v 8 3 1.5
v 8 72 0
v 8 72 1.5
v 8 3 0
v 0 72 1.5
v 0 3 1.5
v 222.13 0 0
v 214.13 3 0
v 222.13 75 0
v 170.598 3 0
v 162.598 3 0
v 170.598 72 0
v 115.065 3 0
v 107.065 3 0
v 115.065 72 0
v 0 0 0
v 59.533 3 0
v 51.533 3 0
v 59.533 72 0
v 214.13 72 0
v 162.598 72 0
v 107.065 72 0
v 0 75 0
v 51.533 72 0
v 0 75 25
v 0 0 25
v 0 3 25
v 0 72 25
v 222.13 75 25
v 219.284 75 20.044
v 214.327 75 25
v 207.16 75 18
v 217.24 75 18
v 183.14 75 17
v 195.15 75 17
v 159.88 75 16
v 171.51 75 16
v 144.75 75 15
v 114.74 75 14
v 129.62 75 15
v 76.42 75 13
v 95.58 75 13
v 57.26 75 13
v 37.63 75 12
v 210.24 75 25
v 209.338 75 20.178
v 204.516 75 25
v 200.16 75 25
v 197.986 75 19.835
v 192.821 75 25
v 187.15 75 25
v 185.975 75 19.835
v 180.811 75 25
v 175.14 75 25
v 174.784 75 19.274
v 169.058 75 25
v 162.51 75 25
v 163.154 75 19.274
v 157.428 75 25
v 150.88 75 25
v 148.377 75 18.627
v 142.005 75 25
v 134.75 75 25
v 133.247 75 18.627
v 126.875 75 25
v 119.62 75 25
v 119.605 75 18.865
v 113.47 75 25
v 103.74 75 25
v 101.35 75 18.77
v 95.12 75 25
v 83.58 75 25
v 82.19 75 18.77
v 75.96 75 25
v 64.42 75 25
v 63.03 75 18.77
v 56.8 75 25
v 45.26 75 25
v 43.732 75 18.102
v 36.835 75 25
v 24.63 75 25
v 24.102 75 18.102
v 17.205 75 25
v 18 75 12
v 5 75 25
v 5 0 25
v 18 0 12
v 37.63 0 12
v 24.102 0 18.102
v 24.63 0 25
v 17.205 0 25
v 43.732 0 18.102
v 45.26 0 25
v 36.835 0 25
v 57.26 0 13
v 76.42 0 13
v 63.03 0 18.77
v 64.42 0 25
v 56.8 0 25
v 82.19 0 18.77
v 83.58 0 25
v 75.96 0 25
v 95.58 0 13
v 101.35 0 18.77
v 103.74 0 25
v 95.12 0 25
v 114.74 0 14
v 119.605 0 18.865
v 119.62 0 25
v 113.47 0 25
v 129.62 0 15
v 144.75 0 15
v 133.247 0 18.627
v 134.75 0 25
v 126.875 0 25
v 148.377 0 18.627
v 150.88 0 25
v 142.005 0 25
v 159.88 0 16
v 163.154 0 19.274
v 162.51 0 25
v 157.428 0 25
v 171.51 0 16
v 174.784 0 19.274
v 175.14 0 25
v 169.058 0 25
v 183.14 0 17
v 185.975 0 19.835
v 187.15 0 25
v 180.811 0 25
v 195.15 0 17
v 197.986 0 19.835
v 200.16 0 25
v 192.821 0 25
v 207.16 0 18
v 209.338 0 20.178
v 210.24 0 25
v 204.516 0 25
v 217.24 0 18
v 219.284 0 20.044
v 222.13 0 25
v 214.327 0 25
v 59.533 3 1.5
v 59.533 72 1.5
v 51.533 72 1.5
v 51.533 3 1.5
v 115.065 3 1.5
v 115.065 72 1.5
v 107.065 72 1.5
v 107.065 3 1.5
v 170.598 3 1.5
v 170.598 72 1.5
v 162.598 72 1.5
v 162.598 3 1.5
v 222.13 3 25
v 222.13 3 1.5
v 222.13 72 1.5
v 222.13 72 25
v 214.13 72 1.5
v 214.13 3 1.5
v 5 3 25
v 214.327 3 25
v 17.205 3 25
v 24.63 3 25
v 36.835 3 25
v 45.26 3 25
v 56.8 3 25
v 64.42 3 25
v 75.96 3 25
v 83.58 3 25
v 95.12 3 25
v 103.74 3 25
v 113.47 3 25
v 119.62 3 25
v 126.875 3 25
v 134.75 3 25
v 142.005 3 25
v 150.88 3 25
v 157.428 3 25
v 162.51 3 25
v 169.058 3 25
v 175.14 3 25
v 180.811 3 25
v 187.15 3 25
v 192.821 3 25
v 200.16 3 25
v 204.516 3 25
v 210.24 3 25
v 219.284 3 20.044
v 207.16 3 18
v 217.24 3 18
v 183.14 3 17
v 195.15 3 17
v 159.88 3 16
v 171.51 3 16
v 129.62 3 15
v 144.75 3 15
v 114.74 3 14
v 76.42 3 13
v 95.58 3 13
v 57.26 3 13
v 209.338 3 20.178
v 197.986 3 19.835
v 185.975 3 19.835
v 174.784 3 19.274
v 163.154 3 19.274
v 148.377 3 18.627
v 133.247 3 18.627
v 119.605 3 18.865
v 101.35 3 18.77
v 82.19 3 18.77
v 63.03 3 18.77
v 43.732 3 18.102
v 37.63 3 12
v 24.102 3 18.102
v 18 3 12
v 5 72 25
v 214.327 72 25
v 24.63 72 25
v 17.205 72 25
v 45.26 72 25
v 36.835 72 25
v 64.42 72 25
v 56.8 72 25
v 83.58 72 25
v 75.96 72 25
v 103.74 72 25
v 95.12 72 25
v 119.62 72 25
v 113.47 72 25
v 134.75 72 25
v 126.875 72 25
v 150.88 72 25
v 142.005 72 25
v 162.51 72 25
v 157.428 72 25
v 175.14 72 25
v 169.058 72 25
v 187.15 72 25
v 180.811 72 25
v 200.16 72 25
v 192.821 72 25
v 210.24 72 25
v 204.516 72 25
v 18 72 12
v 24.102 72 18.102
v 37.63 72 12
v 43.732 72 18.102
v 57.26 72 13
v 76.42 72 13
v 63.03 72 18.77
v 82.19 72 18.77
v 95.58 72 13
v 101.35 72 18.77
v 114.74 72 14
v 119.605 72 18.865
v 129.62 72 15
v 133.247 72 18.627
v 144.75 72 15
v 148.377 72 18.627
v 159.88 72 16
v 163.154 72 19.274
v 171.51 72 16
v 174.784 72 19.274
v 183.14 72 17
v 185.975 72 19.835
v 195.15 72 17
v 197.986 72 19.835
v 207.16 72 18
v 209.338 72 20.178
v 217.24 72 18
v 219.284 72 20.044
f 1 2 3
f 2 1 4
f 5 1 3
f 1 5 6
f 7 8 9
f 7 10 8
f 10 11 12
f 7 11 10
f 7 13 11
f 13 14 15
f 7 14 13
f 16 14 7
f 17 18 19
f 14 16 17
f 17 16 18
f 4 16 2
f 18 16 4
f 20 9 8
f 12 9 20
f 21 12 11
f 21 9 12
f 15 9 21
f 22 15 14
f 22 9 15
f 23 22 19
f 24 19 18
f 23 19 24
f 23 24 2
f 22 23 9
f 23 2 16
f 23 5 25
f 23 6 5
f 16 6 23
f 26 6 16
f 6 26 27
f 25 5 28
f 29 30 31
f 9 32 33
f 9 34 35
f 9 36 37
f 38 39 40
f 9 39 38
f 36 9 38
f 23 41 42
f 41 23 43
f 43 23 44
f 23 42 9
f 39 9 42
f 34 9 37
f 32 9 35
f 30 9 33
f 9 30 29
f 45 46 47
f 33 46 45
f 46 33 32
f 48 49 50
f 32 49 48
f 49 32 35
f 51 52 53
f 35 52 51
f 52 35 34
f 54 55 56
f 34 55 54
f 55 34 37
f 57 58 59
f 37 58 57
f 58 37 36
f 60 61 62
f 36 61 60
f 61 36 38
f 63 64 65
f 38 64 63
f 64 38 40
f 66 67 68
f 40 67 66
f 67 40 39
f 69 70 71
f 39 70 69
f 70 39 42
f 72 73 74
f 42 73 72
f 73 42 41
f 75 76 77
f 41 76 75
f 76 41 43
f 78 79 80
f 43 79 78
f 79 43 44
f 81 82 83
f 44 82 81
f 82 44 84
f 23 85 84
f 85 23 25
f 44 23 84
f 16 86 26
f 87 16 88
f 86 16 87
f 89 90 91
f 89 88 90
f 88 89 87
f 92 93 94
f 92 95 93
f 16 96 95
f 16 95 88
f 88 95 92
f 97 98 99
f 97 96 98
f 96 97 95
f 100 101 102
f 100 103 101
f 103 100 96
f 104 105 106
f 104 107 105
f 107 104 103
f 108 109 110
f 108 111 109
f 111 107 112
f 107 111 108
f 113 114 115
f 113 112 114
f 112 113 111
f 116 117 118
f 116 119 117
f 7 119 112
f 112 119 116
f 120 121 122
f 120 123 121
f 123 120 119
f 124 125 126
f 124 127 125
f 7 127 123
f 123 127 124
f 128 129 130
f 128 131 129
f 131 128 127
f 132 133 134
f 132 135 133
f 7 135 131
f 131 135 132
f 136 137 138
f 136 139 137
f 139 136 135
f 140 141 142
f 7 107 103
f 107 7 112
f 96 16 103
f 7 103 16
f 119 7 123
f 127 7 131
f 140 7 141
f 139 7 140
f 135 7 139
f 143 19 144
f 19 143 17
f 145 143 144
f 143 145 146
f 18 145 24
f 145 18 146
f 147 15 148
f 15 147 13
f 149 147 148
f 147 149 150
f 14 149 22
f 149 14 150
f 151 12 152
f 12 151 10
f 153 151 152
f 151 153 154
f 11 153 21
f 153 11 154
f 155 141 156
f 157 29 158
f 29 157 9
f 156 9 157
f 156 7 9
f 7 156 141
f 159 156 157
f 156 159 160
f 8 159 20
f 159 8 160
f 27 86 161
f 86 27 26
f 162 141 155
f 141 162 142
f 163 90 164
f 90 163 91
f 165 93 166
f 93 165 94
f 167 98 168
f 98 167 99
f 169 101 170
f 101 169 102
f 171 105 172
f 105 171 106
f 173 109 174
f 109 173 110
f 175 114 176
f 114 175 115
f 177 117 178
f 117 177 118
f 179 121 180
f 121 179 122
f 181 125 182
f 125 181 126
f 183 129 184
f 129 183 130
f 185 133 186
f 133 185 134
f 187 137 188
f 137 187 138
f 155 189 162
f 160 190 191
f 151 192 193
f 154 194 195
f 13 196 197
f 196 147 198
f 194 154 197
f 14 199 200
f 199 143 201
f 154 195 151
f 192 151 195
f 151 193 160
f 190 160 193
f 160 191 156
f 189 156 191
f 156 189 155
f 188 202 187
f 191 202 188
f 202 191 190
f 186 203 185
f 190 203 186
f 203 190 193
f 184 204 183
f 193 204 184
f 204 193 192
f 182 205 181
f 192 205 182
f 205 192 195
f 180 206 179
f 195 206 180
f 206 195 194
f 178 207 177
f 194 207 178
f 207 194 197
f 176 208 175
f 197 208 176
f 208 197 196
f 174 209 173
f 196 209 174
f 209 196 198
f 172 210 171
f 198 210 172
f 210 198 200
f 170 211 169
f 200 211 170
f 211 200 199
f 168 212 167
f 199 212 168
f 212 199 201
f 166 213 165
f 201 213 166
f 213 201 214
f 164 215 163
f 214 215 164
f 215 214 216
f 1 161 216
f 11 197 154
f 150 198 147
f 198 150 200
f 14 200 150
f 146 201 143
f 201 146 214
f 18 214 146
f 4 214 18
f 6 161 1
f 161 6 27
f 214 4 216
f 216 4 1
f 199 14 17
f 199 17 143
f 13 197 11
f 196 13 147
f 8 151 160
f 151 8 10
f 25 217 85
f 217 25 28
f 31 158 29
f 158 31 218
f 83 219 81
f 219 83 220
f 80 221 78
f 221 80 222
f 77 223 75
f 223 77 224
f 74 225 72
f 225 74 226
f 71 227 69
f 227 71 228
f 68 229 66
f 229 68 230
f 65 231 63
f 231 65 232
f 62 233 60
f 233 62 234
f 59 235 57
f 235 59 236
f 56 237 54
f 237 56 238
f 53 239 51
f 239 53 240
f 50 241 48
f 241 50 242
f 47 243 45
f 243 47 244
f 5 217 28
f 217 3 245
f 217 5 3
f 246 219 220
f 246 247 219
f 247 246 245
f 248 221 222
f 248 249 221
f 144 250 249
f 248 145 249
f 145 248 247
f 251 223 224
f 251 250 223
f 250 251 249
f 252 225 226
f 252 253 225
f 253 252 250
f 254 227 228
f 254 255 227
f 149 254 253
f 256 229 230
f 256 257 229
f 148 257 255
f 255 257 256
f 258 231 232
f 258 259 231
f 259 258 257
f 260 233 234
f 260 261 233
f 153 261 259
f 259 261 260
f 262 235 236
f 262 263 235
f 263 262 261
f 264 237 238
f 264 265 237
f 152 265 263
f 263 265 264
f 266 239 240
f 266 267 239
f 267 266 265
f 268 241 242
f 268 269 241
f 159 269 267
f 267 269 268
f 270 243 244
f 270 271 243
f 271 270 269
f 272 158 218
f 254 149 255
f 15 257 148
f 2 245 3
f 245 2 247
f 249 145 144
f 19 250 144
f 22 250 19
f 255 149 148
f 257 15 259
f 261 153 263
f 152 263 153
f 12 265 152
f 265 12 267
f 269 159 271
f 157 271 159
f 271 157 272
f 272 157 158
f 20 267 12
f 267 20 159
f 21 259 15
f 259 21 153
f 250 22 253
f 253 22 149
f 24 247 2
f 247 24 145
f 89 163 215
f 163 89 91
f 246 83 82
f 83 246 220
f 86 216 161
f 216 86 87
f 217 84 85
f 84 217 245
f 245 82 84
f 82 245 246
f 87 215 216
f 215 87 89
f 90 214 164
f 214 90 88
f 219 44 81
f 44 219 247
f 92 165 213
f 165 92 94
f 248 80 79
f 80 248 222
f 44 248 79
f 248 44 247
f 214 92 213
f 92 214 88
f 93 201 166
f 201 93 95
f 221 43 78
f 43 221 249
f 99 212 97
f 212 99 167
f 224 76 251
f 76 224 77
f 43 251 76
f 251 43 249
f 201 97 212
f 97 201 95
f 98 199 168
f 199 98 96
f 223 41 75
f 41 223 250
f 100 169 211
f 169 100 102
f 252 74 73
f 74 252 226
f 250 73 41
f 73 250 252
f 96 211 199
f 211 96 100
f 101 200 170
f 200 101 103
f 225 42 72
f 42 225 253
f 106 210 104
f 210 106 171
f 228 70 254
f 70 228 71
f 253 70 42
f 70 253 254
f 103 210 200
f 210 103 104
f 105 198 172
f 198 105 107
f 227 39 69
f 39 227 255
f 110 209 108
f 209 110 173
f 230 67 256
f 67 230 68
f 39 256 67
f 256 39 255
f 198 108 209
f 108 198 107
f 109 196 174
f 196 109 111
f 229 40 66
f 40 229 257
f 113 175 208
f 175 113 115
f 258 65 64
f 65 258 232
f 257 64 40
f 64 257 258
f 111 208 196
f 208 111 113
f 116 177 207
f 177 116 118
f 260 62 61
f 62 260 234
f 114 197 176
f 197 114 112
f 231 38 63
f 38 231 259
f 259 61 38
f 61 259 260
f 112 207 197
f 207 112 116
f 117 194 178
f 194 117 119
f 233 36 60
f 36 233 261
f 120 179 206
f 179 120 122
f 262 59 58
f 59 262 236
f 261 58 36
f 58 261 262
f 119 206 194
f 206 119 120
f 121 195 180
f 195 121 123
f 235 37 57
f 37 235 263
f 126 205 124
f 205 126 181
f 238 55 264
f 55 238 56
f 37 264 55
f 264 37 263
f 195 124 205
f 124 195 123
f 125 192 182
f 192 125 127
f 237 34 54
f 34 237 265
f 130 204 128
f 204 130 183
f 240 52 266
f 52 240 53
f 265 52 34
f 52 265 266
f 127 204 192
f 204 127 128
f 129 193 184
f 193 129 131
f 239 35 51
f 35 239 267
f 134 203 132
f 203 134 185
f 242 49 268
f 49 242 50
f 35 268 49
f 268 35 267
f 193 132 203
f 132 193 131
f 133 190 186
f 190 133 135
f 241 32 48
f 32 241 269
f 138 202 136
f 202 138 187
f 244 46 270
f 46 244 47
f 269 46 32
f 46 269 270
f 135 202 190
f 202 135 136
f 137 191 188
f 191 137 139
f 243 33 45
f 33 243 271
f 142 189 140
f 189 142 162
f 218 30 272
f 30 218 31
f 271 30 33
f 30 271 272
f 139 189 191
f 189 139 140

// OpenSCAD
//               11/16  11/16    5/8    5/8    5/8   9/16    1/2    1/2   7/16   7/16    3/8    3/8   5/16    1/4
widths        = [ 8.63,  8.63,  8.16,  8.16,  8.16,  6.88,  5.13,  5.13,  4.63,  4.63,  4.01,  4.01,  3.08,  2.89];
spacing       = [11,    11,    11,    11,    11,     8,    10,    10,     7,     7,     8,     8,     7,     7];
pocket_depth  = [13,    13,    12,    12,    12,    11,    10,    10,     9,     9,     8,     8,     7,     7];
imprint_width = [98,    98,    87,    87,    87,    77,    66,    66,    55,    55,    55,    55,    55,    55];

base_width  = 75.0;
rail_width  =  3.0;
rail_height = 25.0;
cross_bars  =  5;

function sum (v, i = 0, r = 0) = i < len (v) ? sum (v, i + 1, r + v [i]) : r;
function subarray (list, begin = 0, end = -1) = [
  let (end = end < 0 ? len (list) : end)
    for (i = [begin : 1 : end - 1])
      list [i]
];

length = sum (widths) + sum (spacing) + 13;

difference () {
  union () {
    for (i = [0 : cross_bars - 1])
      translate ([i == 0 ? 0 : ((length / (cross_bars - 1)) * i) - (i == (cross_bars - 1) ? 8 : 4), 0, 0])
        cube ([8, base_width, 1.5]);
    translate ([0, 0, 0])
      cube ([length, rail_width, rail_height]);
    translate ([0, base_width - rail_width, 0])
      cube ([length, rail_width, rail_height]);
  }

  for (i = [0 : len (widths) - 1]) {
    translate ([18 + sum (subarray (spacing, 0, i)) + sum (subarray (widths, 0, i)), -0.01, rail_height - pocket_depth [i]])
      rotate ([0, 315, 0])
        cube ([widths [i], base_width + 0.02, 25]);
  }
}
